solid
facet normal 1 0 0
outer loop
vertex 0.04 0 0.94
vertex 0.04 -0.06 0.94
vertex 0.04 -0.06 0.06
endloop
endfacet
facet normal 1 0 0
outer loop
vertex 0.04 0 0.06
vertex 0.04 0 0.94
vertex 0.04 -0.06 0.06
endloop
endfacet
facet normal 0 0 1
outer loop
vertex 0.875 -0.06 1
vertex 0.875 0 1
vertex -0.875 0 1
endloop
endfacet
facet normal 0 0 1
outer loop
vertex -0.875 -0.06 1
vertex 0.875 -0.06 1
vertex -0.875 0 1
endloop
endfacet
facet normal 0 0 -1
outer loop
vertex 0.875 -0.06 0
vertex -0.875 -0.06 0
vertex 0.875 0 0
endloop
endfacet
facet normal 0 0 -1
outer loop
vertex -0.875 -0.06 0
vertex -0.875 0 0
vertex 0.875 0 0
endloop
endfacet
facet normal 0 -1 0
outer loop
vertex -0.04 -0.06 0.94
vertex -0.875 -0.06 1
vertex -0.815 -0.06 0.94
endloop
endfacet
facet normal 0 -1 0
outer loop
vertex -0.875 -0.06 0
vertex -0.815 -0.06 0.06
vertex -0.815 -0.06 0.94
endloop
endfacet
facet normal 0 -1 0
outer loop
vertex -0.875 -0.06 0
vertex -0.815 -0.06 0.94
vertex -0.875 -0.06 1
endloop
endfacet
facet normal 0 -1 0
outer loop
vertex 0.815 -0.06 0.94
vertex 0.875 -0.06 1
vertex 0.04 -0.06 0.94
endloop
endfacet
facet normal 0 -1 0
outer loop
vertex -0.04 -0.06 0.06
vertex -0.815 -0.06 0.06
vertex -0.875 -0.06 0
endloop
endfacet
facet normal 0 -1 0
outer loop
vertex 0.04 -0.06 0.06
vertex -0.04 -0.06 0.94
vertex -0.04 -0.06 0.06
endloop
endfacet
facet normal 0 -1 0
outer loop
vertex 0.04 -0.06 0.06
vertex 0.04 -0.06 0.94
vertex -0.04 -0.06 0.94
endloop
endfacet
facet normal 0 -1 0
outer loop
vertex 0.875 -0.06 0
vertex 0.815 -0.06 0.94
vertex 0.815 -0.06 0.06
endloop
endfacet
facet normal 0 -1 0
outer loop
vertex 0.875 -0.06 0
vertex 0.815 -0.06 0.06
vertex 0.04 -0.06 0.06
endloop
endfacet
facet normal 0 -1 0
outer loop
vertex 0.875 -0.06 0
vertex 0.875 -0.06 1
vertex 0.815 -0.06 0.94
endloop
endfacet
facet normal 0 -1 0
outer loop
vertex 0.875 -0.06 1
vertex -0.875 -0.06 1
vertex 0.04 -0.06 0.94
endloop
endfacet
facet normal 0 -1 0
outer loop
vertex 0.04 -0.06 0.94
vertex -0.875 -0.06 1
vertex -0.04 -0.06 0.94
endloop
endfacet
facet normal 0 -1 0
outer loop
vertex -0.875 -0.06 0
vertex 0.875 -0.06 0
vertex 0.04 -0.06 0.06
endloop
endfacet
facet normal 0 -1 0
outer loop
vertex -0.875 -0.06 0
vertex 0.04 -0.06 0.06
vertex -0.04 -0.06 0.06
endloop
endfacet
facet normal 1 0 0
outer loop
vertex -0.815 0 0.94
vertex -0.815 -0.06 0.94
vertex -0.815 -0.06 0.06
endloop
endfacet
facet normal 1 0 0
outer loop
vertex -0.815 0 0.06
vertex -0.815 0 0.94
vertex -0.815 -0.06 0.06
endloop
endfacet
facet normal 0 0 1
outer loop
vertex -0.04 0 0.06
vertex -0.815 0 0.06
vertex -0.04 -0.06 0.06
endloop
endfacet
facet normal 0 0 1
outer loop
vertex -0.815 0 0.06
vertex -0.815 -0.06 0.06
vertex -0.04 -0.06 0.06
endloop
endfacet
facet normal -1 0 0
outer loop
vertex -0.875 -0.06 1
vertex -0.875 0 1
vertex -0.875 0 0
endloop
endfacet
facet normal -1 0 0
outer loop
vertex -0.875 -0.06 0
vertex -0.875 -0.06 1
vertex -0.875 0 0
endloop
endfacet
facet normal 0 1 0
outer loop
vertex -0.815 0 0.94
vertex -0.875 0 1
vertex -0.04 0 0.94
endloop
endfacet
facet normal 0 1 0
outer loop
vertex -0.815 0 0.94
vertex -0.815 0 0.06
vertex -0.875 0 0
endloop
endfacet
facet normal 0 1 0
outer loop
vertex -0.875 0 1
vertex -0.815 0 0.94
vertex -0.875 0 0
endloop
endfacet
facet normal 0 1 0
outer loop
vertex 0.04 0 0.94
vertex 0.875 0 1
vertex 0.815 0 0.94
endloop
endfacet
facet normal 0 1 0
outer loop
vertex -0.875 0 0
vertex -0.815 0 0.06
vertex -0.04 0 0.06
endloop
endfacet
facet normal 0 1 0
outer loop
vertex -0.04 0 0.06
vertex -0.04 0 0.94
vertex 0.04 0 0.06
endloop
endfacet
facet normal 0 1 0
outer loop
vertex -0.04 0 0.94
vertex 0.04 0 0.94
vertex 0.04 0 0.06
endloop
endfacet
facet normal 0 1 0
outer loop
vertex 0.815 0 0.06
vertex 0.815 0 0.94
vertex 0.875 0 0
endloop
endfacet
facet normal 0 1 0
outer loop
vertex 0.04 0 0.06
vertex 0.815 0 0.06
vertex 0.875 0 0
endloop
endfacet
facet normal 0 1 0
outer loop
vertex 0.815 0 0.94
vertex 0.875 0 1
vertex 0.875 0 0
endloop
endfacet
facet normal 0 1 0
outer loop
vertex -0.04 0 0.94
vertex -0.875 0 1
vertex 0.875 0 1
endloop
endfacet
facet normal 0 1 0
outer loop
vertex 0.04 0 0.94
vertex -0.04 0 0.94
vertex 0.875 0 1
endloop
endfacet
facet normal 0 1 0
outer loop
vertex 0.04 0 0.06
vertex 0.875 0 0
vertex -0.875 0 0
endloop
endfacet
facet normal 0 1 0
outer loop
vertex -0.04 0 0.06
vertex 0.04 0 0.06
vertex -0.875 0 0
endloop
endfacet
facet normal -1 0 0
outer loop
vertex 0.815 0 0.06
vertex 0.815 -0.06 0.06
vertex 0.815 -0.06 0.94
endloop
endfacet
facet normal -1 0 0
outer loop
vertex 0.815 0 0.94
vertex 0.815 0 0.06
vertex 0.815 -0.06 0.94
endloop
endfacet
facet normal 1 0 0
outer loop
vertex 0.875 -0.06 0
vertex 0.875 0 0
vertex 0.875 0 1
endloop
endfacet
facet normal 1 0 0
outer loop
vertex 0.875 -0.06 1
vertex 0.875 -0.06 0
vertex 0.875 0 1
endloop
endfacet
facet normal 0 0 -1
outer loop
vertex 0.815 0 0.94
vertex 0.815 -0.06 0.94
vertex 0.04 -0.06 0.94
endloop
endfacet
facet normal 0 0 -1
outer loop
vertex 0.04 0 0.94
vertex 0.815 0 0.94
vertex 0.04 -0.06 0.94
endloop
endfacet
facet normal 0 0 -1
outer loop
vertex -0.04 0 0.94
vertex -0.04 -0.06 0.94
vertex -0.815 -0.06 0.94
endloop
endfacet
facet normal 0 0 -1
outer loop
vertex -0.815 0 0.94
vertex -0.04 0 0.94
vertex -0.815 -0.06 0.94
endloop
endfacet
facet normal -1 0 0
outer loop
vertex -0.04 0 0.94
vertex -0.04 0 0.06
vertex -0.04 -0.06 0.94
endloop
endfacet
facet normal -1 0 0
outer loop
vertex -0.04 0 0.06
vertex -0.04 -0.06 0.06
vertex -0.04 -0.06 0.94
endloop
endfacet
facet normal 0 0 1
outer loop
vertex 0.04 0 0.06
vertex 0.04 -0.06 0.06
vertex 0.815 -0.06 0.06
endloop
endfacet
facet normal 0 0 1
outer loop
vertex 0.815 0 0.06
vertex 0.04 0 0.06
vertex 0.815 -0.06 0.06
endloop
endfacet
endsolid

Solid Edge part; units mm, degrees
sketch "Sketch1" plane through (0, 0, 0) normal (0, -1, 0) x (1, 0, 0)
  line L0 (-0.875, 0) -> (0.875, 0)
  line L1 (0.875, 0) -> (0.875, 1)
  line L2 (0.875, 1) -> (-0.875, 1)
  line L3 (-0.875, 1) -> (-0.875, 0)
  dimension "D1" = 1
  dimension "D2" = 1.75
extrude "Protrusion1" add sketch "Sketch1" along normal blind 0.06
sketch "Sketch2" plane through (0, -0.06, 0.75) normal (0, -1, 0) x (1, 0, 0)
  line L0 (0.04, -0.69) -> (0.815, -0.69)
  line L1 (0.815, -0.69) -> (0.815, 0.19)
  line L2 (0.815, 0.19) -> (0.04, 0.19)
  line L3 (0.04, 0.19) -> (0.04, -0.69)
  line L4 (-0.815, -0.69) -> (-0.04, -0.69)
  line L5 (-0.04, -0.69) -> (-0.04, 0.19)
  line L6 (-0.04, 0.19) -> (-0.815, 0.19)
  line L7 (-0.815, 0.19) -> (-0.815, -0.69)
  dimension "D1" = 0.06
  dimension "D2" = 0.08
extrude "Cutout1" cut sketch "Sketch2" against normal up to next
